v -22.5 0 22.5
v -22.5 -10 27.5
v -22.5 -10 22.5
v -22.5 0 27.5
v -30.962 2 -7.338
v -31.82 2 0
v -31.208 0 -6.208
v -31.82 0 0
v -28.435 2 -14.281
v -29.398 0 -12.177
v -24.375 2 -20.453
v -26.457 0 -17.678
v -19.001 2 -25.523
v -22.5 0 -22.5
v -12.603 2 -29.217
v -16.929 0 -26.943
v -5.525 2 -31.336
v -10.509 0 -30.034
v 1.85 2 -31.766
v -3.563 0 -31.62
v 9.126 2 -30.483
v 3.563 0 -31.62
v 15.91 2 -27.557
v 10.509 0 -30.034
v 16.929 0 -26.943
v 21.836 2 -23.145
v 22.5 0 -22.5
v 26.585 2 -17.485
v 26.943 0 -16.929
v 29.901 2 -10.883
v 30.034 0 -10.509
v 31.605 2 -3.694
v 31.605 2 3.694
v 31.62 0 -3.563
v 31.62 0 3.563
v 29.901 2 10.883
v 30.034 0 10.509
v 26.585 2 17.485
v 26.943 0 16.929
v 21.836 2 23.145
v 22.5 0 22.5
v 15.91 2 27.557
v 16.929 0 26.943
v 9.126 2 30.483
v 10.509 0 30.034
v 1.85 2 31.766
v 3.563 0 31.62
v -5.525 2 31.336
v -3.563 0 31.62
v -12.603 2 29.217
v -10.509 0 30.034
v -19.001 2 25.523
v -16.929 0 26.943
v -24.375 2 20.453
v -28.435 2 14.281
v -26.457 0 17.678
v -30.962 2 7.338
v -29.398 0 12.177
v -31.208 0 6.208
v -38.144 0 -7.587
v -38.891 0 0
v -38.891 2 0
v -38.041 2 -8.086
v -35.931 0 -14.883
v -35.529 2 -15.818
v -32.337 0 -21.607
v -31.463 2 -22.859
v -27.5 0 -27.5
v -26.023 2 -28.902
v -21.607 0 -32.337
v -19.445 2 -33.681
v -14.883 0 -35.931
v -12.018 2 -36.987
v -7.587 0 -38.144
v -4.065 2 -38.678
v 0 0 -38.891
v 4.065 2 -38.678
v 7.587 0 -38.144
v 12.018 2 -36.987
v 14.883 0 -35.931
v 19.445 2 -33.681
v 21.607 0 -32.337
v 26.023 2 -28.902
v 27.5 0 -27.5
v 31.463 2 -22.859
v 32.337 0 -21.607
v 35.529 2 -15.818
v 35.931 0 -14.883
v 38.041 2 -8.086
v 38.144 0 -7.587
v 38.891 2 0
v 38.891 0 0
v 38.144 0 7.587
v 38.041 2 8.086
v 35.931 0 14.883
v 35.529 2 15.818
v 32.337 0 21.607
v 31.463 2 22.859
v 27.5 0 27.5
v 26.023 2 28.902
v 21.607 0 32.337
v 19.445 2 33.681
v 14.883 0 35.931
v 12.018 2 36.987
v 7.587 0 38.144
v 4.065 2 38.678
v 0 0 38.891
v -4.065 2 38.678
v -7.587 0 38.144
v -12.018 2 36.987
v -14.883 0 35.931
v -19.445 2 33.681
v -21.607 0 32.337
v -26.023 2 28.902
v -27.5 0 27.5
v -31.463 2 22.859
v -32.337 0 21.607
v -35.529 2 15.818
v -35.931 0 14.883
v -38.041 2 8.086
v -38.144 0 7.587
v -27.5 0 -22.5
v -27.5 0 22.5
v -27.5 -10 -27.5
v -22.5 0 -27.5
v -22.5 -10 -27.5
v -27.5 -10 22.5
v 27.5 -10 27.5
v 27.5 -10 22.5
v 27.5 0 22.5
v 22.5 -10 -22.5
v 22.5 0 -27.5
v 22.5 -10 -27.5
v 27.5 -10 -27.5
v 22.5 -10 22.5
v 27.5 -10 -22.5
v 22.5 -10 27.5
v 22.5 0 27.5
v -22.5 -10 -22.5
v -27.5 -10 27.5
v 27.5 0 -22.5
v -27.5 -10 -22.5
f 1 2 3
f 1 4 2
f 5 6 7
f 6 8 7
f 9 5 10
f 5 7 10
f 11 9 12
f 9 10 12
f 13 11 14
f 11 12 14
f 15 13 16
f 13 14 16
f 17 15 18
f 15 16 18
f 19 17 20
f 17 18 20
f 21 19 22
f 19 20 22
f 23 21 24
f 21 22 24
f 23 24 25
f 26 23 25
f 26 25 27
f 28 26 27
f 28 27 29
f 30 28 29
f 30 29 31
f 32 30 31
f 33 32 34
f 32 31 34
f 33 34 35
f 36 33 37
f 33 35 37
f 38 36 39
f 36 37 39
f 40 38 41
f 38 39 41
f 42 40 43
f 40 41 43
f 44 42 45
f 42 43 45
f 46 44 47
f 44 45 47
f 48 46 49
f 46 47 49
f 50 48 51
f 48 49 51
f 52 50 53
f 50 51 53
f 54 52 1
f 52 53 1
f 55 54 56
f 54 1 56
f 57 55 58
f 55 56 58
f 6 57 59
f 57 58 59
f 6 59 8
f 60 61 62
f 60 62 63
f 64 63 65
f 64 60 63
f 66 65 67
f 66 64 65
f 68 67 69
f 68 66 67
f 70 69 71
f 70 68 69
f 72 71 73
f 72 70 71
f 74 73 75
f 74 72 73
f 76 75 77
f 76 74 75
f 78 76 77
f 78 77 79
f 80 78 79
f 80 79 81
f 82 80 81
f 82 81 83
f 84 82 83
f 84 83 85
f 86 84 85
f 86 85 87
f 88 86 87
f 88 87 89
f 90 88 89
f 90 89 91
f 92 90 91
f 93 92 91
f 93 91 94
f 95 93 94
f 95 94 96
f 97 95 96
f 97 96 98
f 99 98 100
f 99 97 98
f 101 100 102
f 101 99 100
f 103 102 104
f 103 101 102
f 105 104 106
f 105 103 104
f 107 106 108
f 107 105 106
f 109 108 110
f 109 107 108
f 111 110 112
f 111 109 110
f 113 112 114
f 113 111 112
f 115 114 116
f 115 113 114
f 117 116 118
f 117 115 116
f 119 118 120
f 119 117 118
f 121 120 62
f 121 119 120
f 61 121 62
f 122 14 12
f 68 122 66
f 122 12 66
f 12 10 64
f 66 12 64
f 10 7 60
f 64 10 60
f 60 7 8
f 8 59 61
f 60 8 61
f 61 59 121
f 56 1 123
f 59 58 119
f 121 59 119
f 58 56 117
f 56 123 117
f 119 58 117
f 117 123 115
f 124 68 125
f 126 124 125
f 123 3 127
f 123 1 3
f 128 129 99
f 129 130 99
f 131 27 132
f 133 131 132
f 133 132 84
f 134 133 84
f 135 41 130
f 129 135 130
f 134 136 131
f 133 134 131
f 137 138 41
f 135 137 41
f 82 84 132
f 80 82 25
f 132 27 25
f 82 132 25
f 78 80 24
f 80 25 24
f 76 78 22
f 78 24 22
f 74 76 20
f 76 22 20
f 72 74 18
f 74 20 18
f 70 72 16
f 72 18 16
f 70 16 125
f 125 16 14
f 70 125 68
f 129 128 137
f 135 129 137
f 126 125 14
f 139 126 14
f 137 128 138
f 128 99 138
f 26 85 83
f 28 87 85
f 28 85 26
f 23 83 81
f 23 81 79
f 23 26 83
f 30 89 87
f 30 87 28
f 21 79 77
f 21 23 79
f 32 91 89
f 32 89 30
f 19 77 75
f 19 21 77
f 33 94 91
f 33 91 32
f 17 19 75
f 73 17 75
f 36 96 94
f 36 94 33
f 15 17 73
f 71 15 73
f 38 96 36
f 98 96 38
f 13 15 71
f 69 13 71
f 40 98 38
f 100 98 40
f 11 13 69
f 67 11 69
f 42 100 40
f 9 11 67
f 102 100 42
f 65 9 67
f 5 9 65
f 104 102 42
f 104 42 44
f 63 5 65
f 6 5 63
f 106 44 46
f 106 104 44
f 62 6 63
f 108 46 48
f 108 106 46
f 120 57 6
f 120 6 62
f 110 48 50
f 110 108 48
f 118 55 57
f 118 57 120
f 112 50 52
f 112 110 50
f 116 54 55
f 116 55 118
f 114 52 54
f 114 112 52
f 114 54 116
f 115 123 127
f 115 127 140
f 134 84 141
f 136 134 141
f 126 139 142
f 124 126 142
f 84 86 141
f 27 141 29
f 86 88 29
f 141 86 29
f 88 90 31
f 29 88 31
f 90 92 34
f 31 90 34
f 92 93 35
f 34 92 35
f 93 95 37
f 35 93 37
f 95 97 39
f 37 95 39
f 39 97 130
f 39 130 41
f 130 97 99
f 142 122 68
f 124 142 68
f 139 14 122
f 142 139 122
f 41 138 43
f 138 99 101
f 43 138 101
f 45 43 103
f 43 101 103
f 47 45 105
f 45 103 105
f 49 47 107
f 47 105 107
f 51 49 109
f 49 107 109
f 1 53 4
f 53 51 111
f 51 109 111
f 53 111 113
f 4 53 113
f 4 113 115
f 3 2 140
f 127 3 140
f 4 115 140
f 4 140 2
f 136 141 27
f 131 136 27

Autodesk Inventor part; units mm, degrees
ref_plane "YZ Plane" through (0, 0, 0) normal (1, 0, 0) x (0, 1, 0)
ref_plane "XZ Plane" through (0, 0, 0) normal (0, 1, 0) x (-1, 0, 0)
ref_plane "XY Plane" through (0, 0, 0) normal (0, 0, 1) x (1, 0, 0)
sketch "Szkic1" plane through (0, 0, 0) normal (0, 1, 0) x (-1, 0, 0)
  line L0 (-25, -25) -> (25, -25)
  line L1 (25, -25) -> (25, 25)
  line L2 (25, 25) -> (-25, 25)
  line L3 (-25, 25) -> (-25, -25)
  line L4 (-25, -25) -> (25, 25) construction
  line L5 (25, -25) -> (-25, 25) construction
  line L6 (22.5, 22.5) -> (27.5, 22.5)
  line L7 (27.5, 22.5) -> (27.5, 27.5)
  line L8 (27.5, 27.5) -> (22.5, 27.5)
  line L9 (22.5, 27.5) -> (22.5, 22.5)
  line L10 (22.5, 22.5) -> (27.5, 27.5) construction
  line L11 (27.5, 22.5) -> (22.5, 27.5) construction
  line L12 (27.5, -27.5) -> (22.5, -27.5)
  line L13 (22.5, -27.5) -> (22.5, -22.5)
  line L14 (22.5, -22.5) -> (27.5, -22.5)
  line L15 (27.5, -22.5) -> (27.5, -27.5)
  line L16 (27.5, -27.5) -> (22.5, -22.5) construction
  line L17 (22.5, -27.5) -> (27.5, -22.5) construction
  line L18 (-27.5, -22.5) -> (-22.5, -22.5)
  line L19 (-22.5, -22.5) -> (-22.5, -27.5)
  line L20 (-22.5, -27.5) -> (-27.5, -27.5)
  line L21 (-27.5, -27.5) -> (-27.5, -22.5)
  line L22 (-27.5, -22.5) -> (-22.5, -27.5) construction
  line L23 (-22.5, -22.5) -> (-27.5, -27.5) construction
  line L24 (-27.5, 27.5) -> (-22.5, 27.5)
  line L25 (-22.5, 27.5) -> (-22.5, 22.5)
  line L26 (-22.5, 22.5) -> (-27.5, 22.5)
  line L27 (-27.5, 22.5) -> (-27.5, 27.5)
  line L28 (-27.5, 27.5) -> (-22.5, 22.5) construction
  line L29 (-22.5, 27.5) -> (-27.5, 22.5) construction
  circle A0 centre (0, 0) radius 35.3553
  circle A1 centre (0, 0) radius 38.8909
  circle A2 centre (0, 0) radius 31.8198
  point P0 (-19.685, 25)
  point P1 (19.685, 25)
  point P2 (25, 19.685)
  point P3 (25, -19.685)
  point P4 (19.685, -25)
  point P5 (-19.685, -25)
  point P6 (-25, -19.685)
  point P7 (-25, 19.685)
  dimension "d14" = 63.6396
  dimension "d0" = 50
  dimension "d1" = 50
  dimension "d2" = 5
  dimension "d3" = 5
  dimension "d4" = 5
  dimension "d5" = 5
  dimension "d6" = 5
  dimension "d7" = 5
  dimension "d8" = 5
  dimension "d9" = 5
extrude "Wyciągnięcie proste1" add sketch "Szkic1" along normal blind 2 contours L3 L18 L19 L0 | A0 L18 L3 | A0 L19 L20 L21 L18 | L0 L19 A0 | L19 A2 L0 | L0 A2 L13 A0 L19 | L18 A0 L26 L3 A2 | L3 A2 L18 | L18 L21 A1 L27 L26 A0 | A0 L13 L12 A1 L20 L19 | A0 L3 L26 | L26 L27 L24 L25 A0 | A0 L14 L15 L12 L13 | L13 L0 A0 | A2 L13 L0 | L3 L26 A2 | L3 L2 L25 L26 | A0 L25 L2 | L13 L14 L1 L0 | L1 L14 A0 | A2 L1 L14 | L25 L2 A2 | A1 L8 L9 A0 L25 L24 | L15 L14 A0 L6 L7 A1 | L25 A0 L9 L2 A2 | L1 A2 L6 A0 L14 | L7 L6 A0 L9 L8 | A0 L2 L9 | A2 L6 L1 | L2 L9 A2 | L2 L1 L6 L9 | A0 L6 L1
extrude "Wyciągnięcie proste2" add sketch "Szkic1" against normal blind 10 contours L3 L18 L19 L0 | A0 L18 L3 | A0 L19 L20 L21 L18 | L0 L19 A0 | A0 L3 L26 | L26 L27 L24 L25 A0 | A0 L14 L15 L12 L13 | L13 L0 A0 | L3 L2 L25 L26 | A0 L25 L2 | L13 L14 L1 L0 | L1 L14 A0 | L7 L6 A0 L9 L8 | A0 L2 L9 | L2 L1 L6 L9 | A0 L6 L1
equation "\"d7\" = d6"
properties part number "Tarcza_Podkładka" material "Polietylen o dużej gęstości"
